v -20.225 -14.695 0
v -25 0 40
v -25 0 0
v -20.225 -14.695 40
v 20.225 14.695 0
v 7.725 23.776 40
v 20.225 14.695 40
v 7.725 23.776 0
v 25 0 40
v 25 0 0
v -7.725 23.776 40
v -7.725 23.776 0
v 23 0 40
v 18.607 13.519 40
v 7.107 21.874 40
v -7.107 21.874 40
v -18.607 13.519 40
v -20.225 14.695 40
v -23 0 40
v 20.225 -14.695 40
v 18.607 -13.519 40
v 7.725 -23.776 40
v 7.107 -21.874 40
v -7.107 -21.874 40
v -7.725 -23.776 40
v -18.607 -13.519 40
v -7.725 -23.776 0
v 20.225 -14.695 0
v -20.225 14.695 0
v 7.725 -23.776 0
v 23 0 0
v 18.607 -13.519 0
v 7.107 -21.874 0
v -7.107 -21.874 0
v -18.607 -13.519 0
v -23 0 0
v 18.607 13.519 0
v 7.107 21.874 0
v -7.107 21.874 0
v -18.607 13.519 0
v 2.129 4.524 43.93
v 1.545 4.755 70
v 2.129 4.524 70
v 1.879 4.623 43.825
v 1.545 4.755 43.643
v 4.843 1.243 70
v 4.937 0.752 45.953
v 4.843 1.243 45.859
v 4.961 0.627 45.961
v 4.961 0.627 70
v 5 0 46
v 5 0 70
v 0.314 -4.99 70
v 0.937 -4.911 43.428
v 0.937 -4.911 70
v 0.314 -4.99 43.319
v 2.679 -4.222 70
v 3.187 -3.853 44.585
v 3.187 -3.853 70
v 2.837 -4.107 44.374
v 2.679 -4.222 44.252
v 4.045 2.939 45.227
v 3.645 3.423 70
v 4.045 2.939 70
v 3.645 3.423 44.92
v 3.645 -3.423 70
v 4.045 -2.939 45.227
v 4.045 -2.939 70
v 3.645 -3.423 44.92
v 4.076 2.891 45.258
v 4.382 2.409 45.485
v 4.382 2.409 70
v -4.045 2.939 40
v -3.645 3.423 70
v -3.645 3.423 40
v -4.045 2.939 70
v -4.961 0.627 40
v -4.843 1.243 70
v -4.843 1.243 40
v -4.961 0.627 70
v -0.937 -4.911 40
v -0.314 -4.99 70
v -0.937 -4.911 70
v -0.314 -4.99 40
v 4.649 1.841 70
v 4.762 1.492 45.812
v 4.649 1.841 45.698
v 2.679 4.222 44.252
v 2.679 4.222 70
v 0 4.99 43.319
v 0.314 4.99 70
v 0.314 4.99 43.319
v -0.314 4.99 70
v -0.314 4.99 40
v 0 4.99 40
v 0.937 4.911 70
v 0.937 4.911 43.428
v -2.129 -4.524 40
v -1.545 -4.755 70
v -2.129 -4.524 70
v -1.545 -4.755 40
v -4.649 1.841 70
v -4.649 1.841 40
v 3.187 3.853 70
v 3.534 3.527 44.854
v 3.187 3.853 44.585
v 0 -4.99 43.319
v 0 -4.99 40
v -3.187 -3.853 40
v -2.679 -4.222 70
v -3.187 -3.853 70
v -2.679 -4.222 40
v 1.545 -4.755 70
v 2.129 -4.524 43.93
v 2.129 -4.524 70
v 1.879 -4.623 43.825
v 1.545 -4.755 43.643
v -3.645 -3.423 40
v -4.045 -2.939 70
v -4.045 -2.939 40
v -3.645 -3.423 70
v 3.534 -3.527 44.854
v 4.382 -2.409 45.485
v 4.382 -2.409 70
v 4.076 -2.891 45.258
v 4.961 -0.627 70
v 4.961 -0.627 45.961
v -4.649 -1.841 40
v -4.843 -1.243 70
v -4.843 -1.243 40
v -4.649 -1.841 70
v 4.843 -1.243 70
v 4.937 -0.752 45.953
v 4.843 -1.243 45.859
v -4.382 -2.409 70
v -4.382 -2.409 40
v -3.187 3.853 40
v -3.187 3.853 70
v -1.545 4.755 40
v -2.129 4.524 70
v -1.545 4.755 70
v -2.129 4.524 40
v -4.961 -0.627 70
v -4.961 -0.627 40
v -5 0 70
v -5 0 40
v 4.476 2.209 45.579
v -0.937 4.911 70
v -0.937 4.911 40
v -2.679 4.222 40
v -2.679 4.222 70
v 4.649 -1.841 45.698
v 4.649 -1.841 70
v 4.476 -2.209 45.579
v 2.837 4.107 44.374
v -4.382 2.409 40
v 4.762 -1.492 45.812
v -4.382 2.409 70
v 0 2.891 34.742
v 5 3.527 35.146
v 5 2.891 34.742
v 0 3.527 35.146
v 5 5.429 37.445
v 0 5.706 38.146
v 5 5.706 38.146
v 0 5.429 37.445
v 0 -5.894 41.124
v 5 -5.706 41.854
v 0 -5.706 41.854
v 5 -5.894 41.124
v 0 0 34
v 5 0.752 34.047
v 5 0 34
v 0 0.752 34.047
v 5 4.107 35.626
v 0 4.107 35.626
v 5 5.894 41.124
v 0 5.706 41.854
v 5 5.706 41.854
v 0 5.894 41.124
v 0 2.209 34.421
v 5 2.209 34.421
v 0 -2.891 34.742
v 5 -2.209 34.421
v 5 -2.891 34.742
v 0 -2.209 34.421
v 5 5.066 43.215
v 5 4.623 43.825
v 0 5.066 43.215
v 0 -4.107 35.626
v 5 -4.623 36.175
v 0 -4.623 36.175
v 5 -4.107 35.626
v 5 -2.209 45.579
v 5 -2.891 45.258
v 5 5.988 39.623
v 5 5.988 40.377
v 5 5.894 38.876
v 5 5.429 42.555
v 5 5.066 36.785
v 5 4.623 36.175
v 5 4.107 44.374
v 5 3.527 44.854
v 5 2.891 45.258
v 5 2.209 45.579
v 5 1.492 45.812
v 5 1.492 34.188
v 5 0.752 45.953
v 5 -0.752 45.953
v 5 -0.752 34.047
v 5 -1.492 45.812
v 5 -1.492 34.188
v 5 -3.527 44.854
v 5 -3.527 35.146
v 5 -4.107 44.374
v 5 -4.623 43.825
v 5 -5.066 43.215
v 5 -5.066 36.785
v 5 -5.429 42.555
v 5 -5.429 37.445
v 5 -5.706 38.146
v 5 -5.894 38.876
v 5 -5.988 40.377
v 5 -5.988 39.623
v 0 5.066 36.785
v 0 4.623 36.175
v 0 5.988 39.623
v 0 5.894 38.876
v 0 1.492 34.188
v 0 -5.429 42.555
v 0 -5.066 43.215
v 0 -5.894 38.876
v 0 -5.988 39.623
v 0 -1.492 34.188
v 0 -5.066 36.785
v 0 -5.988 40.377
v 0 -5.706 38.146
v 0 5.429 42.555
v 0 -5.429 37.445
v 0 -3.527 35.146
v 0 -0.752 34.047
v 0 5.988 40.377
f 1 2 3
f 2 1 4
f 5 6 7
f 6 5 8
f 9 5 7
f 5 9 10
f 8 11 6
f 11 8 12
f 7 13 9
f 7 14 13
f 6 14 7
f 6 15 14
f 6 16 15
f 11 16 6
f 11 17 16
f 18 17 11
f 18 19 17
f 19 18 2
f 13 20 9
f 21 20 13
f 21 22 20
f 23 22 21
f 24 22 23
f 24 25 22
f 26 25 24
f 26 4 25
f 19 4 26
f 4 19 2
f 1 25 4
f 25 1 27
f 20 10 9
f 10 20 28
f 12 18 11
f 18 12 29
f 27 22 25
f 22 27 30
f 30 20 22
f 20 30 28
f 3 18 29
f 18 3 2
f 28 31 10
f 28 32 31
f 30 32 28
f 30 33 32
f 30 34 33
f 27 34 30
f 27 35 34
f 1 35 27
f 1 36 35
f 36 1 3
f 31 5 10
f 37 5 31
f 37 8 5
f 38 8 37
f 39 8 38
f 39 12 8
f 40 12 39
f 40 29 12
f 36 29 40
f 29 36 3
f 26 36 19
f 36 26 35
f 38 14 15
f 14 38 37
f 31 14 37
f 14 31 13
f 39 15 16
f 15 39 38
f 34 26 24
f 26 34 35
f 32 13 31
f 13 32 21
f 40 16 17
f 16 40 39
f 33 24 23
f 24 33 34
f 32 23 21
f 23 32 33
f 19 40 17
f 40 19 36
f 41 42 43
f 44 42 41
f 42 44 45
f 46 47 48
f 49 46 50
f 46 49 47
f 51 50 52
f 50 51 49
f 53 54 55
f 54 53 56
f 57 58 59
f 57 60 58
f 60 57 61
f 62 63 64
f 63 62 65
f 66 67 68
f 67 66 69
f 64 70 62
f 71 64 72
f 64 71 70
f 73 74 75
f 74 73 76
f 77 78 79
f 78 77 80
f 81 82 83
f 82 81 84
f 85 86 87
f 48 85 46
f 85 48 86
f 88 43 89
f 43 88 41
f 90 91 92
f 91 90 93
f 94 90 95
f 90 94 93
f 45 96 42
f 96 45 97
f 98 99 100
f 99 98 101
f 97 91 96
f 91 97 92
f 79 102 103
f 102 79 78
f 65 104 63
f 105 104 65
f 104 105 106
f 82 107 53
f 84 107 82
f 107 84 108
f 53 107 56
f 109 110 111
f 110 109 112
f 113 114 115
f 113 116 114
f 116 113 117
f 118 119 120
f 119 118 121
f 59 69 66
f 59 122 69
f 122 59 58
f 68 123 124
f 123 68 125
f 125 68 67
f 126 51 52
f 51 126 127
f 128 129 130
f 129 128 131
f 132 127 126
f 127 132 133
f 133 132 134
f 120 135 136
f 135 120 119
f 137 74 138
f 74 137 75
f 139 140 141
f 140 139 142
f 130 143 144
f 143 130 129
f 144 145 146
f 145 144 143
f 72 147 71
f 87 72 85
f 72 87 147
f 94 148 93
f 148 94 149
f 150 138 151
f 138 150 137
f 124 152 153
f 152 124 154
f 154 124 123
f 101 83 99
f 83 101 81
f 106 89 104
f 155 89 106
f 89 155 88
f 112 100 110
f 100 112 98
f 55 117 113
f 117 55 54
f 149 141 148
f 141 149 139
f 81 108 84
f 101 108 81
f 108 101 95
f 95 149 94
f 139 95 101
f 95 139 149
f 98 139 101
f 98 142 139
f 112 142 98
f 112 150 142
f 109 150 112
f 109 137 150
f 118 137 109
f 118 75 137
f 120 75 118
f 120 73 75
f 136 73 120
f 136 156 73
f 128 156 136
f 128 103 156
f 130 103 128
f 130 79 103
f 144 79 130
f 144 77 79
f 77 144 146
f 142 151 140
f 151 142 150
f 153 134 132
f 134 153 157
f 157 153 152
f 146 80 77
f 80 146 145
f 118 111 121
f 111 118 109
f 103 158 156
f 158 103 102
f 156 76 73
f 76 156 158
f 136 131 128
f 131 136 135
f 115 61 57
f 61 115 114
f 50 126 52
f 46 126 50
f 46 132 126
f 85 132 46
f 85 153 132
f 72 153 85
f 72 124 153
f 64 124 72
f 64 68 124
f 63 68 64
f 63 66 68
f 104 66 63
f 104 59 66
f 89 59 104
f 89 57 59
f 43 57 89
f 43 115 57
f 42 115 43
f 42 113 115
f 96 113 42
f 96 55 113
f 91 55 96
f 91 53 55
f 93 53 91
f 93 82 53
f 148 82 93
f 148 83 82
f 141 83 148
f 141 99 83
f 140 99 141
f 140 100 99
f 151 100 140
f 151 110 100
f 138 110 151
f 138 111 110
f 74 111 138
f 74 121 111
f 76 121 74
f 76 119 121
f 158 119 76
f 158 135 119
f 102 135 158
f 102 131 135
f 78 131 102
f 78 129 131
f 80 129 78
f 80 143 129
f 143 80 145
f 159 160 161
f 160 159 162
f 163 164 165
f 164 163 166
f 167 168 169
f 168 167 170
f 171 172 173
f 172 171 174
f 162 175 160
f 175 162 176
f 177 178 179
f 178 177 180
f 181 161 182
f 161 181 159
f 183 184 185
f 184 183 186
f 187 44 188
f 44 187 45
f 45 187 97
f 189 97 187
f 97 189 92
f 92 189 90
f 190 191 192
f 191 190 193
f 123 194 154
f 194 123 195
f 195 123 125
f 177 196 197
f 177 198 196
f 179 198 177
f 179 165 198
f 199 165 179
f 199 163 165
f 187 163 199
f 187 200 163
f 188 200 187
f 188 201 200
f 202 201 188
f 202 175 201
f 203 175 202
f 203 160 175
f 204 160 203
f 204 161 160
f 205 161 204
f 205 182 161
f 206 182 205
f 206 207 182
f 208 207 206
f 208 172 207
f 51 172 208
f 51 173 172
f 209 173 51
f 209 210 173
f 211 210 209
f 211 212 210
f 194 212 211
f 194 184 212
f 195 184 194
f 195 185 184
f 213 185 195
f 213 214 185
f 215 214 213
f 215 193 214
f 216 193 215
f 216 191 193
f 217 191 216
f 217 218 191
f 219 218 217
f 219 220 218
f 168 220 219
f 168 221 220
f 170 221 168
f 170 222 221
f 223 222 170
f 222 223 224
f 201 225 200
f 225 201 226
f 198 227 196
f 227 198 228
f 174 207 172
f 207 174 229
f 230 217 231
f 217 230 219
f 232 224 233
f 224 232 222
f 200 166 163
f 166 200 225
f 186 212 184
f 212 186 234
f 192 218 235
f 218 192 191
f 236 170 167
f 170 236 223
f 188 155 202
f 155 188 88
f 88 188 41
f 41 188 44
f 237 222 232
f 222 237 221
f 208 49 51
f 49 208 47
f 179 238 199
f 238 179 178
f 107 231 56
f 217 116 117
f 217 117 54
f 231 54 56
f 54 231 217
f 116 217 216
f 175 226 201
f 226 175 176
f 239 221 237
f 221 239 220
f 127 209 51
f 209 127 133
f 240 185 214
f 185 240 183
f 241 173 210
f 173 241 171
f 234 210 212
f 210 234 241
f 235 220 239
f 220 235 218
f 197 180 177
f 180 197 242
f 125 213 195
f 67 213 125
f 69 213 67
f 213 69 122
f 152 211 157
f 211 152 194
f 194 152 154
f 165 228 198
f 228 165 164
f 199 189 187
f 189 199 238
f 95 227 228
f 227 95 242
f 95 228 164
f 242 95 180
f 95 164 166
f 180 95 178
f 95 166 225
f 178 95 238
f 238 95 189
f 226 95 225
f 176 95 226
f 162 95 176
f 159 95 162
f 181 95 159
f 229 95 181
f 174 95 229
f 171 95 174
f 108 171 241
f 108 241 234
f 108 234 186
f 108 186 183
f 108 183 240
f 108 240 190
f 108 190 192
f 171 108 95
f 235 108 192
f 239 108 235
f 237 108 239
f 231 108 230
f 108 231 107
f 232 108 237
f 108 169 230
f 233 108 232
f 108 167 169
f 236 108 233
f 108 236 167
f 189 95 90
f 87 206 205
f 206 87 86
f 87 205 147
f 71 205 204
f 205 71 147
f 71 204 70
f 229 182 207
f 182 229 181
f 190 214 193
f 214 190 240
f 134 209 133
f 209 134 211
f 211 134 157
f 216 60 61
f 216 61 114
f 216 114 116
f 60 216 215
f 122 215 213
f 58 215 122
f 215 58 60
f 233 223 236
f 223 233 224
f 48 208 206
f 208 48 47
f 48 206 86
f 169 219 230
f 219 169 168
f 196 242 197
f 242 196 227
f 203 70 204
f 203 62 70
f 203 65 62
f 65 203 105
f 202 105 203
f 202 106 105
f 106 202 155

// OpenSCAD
mug_radius = 25;
mug_height = 40;
wall_thickness = 2;
handle_radius = 5;
handle_length = 30;

union() {
    difference() {
        cylinder(r = mug_radius, h = mug_height, $fn = 10);
        translate([0, 0, -1])
            cylinder(r = mug_radius - wall_thickness, h = mug_height + 2, $fn = 10);
    }

    translate([0, 0, mug_height])
        cylinder(r = handle_radius, h = handle_length, $fn = 50);

    translate([0, 0, mug_height])
        rotate([0, 90, 0])
            cylinder(r = handle_radius + 1, h = 5, $fn = 50);
}
